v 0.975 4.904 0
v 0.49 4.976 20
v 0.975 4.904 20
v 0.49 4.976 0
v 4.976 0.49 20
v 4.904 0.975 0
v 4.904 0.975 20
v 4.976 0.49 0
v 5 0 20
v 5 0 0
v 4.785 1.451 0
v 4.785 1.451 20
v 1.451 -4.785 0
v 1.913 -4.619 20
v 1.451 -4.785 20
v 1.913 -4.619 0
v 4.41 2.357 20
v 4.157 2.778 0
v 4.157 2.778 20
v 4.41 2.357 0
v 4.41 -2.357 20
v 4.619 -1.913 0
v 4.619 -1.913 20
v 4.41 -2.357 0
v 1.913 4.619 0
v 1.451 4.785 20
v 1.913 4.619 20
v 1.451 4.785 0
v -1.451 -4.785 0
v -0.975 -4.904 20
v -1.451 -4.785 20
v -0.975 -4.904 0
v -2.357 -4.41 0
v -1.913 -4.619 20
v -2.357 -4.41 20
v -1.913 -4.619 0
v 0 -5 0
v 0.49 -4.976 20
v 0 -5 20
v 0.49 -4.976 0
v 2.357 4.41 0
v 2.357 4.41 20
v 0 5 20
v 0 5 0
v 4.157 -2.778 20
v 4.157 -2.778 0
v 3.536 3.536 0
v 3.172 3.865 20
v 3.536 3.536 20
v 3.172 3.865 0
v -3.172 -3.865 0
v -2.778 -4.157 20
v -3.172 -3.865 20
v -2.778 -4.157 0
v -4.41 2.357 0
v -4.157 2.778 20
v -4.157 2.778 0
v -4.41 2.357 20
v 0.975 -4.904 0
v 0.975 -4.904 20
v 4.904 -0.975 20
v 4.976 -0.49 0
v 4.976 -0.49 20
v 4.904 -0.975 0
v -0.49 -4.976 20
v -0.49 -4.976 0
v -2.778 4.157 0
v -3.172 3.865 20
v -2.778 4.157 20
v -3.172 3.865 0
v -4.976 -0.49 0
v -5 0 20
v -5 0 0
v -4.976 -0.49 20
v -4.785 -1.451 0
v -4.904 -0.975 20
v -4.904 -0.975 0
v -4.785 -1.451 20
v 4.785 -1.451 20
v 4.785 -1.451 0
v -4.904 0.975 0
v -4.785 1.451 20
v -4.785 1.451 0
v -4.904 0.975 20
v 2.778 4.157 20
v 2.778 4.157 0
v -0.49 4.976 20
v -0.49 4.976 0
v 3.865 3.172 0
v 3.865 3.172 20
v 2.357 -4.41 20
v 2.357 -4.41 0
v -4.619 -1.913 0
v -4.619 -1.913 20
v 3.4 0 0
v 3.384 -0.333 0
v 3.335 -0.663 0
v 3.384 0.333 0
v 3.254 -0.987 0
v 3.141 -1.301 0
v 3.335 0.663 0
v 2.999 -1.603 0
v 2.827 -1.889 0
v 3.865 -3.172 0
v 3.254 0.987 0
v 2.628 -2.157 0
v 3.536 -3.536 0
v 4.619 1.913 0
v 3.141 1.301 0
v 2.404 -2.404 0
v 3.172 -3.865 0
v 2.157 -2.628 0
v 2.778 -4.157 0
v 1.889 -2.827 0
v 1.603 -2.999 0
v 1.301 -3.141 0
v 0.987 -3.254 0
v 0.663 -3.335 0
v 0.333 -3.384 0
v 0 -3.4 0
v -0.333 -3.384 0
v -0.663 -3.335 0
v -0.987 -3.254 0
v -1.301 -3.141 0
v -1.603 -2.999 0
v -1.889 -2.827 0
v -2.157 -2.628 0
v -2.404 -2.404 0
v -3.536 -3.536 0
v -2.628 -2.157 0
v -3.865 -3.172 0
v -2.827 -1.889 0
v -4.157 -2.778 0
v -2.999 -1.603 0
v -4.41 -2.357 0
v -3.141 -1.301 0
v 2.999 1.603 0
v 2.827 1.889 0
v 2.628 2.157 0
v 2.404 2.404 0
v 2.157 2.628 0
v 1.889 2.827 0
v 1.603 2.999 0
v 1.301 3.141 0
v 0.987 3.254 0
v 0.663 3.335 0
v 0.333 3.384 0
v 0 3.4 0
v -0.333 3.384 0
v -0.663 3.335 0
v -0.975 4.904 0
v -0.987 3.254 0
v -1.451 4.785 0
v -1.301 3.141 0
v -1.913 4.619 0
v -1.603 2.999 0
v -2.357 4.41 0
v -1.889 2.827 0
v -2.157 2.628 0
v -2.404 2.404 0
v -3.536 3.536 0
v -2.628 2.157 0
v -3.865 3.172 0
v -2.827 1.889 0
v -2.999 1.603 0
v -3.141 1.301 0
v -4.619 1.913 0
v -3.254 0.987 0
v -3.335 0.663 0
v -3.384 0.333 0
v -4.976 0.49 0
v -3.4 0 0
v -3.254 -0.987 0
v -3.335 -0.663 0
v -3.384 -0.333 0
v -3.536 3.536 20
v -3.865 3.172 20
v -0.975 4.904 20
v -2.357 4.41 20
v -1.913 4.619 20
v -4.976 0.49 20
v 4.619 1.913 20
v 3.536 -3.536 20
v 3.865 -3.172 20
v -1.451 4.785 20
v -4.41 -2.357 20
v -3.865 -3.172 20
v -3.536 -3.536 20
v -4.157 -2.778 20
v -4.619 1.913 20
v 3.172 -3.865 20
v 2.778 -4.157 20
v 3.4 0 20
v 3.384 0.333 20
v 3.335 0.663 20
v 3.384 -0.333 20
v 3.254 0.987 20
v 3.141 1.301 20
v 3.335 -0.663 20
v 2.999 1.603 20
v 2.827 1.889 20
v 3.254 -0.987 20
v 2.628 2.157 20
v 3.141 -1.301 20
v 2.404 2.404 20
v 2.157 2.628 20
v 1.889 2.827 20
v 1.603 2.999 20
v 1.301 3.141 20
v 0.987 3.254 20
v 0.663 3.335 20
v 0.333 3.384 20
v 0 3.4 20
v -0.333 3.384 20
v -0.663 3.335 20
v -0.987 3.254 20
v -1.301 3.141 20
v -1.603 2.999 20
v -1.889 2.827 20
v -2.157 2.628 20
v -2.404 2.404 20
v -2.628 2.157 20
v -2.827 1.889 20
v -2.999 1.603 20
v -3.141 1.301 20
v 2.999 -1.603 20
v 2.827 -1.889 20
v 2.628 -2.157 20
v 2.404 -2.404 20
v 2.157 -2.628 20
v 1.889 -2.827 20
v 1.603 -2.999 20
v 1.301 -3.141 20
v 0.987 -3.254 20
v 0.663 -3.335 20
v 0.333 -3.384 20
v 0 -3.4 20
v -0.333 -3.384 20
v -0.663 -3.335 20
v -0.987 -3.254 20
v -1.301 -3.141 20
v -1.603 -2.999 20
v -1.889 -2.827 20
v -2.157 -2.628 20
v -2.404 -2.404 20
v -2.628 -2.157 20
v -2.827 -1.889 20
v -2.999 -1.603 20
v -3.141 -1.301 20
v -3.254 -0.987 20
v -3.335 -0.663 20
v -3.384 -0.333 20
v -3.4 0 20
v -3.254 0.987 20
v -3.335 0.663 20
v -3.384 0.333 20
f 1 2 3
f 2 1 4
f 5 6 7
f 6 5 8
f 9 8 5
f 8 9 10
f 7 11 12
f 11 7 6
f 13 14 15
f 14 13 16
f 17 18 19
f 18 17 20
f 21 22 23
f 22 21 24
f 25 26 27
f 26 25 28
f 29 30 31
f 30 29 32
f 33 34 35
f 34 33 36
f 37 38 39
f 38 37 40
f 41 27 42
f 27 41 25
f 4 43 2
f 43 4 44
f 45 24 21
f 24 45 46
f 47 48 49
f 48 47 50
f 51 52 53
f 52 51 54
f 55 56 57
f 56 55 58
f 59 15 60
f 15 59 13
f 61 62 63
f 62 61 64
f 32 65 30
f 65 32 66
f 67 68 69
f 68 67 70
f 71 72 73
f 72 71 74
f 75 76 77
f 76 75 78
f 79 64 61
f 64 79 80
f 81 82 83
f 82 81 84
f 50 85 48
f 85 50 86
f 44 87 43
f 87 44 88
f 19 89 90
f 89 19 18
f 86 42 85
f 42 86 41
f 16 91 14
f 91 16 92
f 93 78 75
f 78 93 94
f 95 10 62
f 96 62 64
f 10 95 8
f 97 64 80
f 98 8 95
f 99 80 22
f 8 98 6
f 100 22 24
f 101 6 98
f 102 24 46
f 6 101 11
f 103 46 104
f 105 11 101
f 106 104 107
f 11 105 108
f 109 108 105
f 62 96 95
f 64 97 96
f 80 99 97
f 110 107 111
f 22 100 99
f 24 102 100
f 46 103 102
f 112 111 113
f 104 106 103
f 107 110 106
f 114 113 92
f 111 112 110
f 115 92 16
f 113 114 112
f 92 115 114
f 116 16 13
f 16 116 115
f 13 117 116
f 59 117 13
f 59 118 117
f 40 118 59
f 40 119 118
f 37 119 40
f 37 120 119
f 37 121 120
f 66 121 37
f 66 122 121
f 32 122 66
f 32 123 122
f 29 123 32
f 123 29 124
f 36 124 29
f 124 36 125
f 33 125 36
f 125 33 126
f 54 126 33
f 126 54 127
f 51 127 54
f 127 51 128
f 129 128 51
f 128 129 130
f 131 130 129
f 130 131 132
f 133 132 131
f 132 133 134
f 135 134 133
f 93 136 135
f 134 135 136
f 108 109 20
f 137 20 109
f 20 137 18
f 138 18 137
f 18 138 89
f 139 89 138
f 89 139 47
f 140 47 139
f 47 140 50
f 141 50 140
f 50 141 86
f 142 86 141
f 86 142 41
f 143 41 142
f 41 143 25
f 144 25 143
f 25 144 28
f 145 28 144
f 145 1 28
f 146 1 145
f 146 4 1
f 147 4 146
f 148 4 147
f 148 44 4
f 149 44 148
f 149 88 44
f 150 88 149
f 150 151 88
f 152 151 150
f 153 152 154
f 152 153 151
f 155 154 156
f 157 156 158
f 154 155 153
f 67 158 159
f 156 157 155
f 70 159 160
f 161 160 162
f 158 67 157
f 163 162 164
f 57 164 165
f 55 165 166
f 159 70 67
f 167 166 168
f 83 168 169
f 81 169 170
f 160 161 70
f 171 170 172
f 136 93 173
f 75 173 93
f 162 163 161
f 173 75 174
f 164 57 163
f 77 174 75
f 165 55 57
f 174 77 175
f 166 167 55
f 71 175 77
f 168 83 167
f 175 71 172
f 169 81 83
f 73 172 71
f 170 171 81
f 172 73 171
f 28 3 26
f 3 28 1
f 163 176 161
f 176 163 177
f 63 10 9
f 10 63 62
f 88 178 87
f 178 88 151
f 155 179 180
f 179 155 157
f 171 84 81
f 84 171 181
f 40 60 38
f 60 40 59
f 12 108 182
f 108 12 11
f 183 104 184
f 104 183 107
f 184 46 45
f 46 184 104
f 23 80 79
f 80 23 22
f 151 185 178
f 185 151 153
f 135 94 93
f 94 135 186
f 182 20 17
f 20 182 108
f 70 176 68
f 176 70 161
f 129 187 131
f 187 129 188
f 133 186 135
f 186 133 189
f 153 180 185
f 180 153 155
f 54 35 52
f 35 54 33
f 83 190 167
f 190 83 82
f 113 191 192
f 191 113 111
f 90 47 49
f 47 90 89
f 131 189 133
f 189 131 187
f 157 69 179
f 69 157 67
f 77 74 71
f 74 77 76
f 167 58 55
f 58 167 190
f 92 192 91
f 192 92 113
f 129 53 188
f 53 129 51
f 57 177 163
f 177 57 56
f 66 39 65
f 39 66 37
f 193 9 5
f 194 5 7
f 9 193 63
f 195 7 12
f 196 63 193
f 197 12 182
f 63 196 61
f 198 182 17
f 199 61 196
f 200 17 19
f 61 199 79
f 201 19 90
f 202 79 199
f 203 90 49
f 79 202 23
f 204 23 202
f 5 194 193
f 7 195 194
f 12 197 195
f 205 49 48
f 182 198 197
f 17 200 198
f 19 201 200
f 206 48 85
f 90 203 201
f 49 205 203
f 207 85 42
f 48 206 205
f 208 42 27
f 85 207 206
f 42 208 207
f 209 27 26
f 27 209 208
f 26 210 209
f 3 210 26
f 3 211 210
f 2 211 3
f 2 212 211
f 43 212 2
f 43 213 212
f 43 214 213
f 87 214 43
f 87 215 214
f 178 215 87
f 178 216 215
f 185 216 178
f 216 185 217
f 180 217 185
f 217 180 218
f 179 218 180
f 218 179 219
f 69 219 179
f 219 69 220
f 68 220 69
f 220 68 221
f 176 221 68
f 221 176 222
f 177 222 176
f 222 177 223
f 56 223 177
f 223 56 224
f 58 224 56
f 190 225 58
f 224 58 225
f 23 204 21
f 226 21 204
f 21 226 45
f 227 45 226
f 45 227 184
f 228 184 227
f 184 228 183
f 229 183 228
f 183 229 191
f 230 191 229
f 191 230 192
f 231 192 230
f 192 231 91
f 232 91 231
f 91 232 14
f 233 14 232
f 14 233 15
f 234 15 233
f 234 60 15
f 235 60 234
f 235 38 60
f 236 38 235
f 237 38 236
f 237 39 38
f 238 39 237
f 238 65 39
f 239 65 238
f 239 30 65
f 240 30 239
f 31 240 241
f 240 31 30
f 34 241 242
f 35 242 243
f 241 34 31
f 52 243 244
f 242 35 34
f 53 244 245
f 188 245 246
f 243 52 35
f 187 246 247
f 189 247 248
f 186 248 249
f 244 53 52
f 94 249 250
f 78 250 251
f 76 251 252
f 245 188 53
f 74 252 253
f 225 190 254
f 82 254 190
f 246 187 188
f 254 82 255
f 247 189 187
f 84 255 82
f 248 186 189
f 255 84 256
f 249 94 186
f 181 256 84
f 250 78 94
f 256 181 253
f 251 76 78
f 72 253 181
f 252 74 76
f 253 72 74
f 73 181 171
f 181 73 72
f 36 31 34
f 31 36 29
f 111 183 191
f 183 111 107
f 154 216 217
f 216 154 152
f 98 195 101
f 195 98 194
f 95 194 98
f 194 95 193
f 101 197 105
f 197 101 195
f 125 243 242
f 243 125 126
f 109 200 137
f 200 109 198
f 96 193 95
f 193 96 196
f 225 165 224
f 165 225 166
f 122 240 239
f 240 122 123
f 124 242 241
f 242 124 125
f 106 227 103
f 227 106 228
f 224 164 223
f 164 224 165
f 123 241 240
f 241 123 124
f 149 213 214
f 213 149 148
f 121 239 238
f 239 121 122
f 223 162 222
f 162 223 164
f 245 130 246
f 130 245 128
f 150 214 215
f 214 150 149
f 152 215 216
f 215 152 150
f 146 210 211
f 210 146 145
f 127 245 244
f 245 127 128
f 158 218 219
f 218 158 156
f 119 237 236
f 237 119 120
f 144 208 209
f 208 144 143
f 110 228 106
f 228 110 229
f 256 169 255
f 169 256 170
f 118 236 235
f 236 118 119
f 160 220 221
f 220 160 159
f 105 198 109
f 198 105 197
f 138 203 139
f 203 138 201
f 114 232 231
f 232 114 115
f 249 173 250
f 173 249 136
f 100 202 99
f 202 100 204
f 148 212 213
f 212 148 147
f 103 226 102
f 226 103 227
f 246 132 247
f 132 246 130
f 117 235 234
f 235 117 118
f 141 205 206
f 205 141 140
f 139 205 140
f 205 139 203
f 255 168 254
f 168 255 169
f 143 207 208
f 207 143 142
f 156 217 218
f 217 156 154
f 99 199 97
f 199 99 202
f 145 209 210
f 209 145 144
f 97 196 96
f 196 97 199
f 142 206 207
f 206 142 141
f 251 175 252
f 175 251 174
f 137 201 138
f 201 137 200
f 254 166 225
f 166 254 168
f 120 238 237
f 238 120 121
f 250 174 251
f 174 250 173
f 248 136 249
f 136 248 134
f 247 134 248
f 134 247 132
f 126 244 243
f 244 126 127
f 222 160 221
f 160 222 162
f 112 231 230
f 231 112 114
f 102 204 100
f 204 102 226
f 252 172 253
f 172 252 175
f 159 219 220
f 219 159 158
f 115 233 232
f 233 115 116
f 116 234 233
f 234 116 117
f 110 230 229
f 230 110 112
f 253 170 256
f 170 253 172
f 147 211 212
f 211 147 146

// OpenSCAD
// Lab Funnel Design
// Units: millimetres
// Orientation: Upright, wide opening at top, rests on XY plane at z=0.

// --- Dimensions ---
// Spout (Tube)
$spout_outer_diameter = 10;
$spout_inner_diameter = 6.8; // 10 - 2*1.6
$spout_length = 20;

// Cone (Funnel)
$cone_bottom_diameter = 10; // Matches spout outer diameter
$cone_top_diameter = 60;
$cone_height = 30; // From z=20 to z=50

// Wall Thickness
$wall_thickness = 1.6;

// Resolution for curved surfaces
$fn = 64;

// --- Helper Functions ---

// Function to create a hollow cylinder (tube)
// Arguments: outer_d, inner_d, height, position (x,y,z)
module hollow_cylinder(outer_d, inner_d, height, pos = [0,0,0]) {
    translate(pos) {
        difference() {
            cylinder(h = height, d = outer_d, $fn = $fn);
            cylinder(h = height, d = inner_d, $fn = $fn);
        }
    }
}

// Function to create a hollow cone using rotate_extrude
// Arguments: bottom_d, top_d, height, position (x,y,z)
// bottom_d is at z=pos[2], top_d is at z=pos[2]+height
module hollow_cone(bottom_d, top_d, height, pos = [0,0,0]) {
    translate(pos) {
        // Calculate inner diameters at bottom and top to maintain wall thickness
        inner_bottom_d = bottom_d - 2 * $wall_thickness;
        inner_top_d = top_d - 2 * $wall_thickness;

        // Define the 2D profile in the XZ plane
        // We need to extrude this profile around the Z-axis.
        // The profile consists of two lines: the outer wall and the inner wall.
        // However, rotate_extrude creates a solid from a closed polygon.
        // To make a hollow shape, we create a large polygon (outer shell) and subtract a smaller polygon (inner hole).
        
        // Outer Profile Points (X, Z)
        // Bottom Left, Bottom Right, Top Right, Top Left
        outer_points = [
            [-bottom_d/2, 0],
            [bottom_d/2, 0],
            [top_d/2, height],
            [-top_d/2, height]
        ];

        // Inner Profile Points (X, Z)
        // Bottom Left, Bottom Right, Top Right, Top Left
        inner_points = [
            [-inner_bottom_d/2, 0],
            [inner_bottom_d/2, 0],
            [inner_top_d/2, height],
            [-inner_top_d/2, height]
        ];

        difference() {
            // Create Outer Shell
            rotate_extrude(angle = 360, $fn = $fn) {
                polygon(points = outer_points);
            }
            
            // Create Inner Hole (Negative space)
            rotate_extrude(angle = 360, $fn = $fn) {
                polygon(points = inner_points);
            }
        }
    }
}

// --- Main Assembly ---

// 1. Build the Spout (Tube)
// Starts at z=0, ends at z=20
hollow_cylinder(
    outer_d = $spout_outer_diameter,
    inner_d = $spout_inner_diameter,
    height = $spout_length,
    pos = [0, 0, 0]
);

// 2. Build the Cone
// Starts at z=20, ends at z=50
hollow_cone(
    bottom_d = $cone_bottom_diameter,
    top_d = $cone_top_diameter,
    height = $cone_height,
    pos = [0, 0, 20]
);
